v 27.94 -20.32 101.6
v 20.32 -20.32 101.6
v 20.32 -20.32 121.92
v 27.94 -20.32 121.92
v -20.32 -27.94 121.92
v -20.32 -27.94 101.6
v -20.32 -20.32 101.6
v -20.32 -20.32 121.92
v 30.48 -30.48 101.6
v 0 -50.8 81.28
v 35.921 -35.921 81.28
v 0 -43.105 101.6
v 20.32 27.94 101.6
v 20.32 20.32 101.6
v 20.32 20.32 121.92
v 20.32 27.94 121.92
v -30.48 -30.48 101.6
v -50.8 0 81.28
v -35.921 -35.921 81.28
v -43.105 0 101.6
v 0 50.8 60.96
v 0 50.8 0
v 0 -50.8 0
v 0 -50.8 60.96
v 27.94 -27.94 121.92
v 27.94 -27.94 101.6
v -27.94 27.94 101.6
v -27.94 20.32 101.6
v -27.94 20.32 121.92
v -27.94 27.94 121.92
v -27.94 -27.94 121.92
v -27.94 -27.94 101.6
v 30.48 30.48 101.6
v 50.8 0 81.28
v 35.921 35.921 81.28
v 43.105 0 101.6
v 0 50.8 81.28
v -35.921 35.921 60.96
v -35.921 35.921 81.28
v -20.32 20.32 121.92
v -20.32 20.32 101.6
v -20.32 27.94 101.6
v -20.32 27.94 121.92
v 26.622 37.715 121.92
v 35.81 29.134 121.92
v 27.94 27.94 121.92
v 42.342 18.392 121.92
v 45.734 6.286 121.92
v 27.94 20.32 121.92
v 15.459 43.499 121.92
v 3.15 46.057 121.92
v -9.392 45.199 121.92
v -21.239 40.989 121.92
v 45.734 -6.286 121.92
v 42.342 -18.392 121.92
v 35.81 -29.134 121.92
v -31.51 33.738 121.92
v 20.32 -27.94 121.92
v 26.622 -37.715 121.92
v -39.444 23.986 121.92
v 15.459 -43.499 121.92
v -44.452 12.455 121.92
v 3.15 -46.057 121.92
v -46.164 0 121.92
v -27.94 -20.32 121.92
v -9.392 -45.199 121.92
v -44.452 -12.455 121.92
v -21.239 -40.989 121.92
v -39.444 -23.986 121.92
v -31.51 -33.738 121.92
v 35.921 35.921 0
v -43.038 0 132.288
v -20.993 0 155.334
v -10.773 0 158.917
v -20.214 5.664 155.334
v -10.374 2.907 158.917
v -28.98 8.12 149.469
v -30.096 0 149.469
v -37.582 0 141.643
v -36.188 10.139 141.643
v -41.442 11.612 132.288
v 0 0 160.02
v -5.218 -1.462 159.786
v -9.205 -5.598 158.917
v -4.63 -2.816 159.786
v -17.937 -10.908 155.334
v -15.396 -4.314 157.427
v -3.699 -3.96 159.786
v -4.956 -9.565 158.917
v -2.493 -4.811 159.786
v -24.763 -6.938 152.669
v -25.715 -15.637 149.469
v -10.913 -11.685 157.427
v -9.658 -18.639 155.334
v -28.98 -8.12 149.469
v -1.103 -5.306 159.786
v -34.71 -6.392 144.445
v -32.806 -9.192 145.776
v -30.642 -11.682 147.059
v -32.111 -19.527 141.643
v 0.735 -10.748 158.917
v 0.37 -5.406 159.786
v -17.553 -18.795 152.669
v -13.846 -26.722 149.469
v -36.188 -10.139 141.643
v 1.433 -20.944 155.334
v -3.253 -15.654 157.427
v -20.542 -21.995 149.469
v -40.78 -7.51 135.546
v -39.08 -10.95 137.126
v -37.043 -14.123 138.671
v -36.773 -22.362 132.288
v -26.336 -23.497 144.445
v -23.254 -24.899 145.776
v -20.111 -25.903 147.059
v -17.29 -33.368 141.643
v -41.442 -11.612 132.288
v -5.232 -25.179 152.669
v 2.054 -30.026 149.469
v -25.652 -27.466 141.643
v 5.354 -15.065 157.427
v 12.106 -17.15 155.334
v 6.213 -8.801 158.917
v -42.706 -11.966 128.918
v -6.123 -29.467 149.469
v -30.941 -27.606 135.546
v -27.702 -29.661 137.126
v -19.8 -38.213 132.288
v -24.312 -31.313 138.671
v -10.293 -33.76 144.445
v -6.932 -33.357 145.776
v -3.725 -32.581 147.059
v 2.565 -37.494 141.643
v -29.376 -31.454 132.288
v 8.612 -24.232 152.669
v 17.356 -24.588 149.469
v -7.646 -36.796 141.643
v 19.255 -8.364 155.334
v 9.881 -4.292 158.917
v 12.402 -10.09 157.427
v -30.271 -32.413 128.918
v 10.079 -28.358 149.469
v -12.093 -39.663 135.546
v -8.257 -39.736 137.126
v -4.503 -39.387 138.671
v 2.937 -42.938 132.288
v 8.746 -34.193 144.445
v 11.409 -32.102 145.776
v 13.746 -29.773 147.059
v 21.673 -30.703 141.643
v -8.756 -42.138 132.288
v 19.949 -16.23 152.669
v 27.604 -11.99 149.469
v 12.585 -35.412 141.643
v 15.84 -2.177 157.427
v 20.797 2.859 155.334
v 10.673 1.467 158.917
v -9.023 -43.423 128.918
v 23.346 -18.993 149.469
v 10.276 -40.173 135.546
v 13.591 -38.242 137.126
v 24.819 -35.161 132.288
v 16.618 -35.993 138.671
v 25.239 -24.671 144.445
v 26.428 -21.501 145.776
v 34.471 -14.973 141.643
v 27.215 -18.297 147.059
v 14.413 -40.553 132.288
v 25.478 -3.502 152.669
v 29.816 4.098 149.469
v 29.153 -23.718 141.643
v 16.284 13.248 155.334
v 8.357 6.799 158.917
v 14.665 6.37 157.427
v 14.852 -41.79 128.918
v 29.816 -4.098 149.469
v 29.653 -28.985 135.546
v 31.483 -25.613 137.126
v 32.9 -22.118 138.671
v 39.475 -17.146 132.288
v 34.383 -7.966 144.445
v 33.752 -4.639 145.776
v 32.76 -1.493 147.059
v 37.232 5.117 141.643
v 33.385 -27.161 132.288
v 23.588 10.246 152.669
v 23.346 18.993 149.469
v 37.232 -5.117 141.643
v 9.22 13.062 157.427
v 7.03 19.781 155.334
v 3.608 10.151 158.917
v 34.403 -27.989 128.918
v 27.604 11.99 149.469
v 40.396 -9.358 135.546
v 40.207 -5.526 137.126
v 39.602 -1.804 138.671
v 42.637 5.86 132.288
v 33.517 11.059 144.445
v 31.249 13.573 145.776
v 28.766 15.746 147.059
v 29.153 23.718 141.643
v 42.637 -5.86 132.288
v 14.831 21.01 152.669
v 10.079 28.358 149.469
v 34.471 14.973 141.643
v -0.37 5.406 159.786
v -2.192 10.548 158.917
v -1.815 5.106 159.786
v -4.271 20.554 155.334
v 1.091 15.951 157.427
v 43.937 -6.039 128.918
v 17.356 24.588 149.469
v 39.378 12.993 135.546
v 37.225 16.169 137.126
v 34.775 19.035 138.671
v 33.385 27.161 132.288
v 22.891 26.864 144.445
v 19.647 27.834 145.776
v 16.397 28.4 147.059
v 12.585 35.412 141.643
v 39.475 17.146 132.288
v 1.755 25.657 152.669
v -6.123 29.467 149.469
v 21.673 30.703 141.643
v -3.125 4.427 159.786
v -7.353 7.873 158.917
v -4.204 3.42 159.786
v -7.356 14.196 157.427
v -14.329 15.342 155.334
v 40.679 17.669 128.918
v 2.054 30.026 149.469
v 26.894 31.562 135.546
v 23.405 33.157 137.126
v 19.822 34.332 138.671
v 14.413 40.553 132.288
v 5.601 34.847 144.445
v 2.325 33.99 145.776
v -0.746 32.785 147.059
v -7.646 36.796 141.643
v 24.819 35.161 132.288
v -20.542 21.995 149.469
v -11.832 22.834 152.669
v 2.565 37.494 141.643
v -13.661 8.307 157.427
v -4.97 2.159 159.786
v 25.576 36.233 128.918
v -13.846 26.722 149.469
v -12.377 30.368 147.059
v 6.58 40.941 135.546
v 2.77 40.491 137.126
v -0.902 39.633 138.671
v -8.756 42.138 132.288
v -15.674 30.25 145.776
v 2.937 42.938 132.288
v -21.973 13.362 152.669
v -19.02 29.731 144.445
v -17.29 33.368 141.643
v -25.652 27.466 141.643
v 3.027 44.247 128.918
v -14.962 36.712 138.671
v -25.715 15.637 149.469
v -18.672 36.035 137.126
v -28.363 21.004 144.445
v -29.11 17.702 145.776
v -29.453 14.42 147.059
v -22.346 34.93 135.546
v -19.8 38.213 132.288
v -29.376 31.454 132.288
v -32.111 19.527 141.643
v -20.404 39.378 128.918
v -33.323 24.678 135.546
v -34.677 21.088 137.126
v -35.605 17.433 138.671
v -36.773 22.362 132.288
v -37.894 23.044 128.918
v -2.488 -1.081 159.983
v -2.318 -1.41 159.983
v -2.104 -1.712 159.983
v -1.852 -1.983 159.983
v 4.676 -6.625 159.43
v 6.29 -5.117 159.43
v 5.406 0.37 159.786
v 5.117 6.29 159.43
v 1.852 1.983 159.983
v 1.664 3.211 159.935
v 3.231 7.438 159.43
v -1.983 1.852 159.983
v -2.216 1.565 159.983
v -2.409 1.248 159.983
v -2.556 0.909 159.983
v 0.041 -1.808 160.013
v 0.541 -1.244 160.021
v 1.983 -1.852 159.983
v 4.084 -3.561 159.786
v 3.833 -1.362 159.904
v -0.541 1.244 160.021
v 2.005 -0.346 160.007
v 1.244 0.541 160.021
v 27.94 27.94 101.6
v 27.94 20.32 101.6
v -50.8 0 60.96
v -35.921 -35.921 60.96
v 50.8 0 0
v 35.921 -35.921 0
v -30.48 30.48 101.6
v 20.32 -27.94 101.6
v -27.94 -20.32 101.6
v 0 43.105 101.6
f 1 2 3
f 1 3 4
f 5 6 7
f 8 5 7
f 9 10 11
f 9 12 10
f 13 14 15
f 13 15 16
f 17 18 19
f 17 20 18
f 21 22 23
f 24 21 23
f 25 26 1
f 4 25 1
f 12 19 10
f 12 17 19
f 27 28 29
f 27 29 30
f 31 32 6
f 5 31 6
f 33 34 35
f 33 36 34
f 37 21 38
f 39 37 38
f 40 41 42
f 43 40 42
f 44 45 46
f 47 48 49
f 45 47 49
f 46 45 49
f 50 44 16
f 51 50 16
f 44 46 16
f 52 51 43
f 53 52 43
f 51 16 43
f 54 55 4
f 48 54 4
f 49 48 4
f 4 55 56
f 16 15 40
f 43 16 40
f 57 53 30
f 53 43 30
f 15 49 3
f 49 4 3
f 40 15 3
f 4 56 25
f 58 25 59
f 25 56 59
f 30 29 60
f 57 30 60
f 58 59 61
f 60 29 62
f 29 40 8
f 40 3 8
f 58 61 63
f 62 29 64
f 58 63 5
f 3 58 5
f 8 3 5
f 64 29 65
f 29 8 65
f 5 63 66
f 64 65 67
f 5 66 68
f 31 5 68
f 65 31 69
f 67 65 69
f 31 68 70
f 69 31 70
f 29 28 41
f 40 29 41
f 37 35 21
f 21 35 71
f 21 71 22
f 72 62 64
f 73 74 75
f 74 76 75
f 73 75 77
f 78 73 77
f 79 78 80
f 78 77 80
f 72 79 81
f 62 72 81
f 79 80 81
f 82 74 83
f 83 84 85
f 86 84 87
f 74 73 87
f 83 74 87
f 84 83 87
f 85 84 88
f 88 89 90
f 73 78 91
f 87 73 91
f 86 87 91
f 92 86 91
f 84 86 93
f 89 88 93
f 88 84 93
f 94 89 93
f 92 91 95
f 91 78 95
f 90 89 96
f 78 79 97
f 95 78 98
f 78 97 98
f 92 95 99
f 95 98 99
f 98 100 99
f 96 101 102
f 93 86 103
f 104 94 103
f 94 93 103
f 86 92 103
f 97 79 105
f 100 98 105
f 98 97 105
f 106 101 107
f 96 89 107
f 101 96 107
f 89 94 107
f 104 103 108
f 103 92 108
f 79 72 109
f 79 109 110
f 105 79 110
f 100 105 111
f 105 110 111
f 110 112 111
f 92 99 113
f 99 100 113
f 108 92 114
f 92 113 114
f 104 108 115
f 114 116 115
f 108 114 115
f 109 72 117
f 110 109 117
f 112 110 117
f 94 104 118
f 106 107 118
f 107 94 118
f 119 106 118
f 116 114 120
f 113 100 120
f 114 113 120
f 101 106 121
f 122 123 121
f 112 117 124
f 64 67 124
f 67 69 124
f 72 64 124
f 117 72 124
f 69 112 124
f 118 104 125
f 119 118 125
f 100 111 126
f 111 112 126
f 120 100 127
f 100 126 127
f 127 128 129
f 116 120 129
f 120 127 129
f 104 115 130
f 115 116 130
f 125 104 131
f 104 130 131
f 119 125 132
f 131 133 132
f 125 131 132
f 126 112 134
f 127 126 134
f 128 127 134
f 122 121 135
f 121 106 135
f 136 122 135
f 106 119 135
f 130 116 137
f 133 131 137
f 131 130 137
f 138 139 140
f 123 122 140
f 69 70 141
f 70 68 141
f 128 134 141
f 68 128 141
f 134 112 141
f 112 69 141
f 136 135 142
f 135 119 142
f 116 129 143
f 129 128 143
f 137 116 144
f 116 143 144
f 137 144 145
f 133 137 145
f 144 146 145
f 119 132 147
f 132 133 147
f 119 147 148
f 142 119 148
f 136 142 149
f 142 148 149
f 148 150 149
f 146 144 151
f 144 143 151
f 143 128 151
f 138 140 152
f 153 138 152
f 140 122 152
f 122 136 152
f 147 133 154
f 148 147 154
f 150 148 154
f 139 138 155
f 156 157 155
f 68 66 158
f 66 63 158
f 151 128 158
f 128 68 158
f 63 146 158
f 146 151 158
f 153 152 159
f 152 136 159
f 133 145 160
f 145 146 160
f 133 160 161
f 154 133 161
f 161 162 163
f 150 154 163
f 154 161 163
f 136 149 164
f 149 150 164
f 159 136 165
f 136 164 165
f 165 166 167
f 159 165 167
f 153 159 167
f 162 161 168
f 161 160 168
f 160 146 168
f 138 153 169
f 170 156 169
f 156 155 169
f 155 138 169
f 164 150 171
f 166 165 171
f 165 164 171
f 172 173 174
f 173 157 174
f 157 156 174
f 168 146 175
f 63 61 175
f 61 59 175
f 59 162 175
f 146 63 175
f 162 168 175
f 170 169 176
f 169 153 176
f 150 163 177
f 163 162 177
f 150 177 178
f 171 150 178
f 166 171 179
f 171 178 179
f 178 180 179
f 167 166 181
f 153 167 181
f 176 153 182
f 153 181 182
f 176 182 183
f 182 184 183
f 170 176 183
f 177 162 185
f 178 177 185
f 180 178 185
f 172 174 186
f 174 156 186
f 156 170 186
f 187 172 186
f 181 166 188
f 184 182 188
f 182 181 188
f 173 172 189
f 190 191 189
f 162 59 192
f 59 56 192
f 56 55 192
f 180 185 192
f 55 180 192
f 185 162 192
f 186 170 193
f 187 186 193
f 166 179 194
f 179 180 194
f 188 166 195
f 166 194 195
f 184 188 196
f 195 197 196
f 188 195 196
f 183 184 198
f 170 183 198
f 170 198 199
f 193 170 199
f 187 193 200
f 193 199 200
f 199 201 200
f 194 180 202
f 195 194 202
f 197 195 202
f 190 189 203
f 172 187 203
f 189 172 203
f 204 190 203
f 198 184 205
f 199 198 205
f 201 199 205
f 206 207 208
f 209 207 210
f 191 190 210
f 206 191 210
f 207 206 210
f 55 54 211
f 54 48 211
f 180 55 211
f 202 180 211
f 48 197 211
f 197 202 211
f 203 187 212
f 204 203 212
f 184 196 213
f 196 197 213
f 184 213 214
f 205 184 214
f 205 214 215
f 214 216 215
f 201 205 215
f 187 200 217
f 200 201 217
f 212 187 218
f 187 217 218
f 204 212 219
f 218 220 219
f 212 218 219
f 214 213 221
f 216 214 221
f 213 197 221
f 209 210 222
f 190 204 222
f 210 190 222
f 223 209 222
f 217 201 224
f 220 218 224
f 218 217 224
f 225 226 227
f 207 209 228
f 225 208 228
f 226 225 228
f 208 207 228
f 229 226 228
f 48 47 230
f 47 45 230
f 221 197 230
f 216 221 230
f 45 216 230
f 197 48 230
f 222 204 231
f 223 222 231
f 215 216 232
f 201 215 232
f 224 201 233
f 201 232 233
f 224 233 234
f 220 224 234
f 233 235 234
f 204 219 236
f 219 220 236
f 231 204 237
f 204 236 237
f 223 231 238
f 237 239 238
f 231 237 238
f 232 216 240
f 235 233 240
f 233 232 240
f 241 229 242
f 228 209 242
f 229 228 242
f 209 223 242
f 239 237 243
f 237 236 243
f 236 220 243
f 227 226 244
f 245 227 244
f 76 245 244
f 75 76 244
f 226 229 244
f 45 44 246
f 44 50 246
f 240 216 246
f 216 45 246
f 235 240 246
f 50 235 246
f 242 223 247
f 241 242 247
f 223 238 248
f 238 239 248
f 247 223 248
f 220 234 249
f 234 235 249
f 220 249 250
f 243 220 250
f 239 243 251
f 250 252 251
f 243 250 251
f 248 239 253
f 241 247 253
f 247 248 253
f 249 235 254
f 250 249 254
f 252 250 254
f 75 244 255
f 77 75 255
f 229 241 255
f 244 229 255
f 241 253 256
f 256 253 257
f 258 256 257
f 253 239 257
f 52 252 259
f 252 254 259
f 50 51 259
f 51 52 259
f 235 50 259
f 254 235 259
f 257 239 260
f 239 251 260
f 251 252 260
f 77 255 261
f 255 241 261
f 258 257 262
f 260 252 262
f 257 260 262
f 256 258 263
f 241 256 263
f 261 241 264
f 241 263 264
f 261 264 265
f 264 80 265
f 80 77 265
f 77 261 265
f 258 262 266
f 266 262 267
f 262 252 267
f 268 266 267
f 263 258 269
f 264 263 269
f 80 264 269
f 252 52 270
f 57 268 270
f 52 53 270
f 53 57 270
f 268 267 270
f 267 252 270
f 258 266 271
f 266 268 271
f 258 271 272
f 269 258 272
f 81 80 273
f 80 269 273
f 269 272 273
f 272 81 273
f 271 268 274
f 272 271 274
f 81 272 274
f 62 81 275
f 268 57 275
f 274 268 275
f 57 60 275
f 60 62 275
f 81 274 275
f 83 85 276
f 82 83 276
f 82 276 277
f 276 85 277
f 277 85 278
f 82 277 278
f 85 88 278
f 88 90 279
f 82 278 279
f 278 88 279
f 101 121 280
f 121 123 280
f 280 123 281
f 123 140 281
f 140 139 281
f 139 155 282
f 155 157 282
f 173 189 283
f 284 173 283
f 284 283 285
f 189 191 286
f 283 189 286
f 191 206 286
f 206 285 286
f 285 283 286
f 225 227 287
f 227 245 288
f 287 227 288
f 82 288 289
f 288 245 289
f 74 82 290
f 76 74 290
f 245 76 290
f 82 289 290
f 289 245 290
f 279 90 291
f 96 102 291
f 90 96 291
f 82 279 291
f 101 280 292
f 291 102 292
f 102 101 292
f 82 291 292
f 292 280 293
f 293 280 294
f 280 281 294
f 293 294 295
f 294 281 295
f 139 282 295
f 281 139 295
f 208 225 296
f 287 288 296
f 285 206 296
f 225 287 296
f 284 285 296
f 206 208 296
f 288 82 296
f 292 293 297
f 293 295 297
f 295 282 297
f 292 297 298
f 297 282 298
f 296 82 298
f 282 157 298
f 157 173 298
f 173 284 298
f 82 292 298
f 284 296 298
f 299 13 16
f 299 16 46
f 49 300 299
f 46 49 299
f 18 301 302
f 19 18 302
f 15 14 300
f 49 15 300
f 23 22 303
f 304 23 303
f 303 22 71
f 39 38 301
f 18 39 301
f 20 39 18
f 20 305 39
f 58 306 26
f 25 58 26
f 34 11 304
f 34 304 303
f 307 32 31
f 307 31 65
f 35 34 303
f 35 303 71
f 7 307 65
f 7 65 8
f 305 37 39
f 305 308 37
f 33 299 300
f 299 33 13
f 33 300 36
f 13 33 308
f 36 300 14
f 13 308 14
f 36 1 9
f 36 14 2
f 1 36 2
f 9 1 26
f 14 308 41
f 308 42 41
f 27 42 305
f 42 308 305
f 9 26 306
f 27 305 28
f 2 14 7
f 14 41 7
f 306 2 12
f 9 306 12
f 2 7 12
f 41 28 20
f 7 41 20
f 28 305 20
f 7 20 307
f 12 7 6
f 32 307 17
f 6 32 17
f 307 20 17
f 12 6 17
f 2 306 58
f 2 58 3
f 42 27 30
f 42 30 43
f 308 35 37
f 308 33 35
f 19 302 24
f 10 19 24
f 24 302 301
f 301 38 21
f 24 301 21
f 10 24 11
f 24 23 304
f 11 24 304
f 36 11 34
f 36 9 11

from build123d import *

# Parameters (mm, degrees)
F2_DEPTH  = 60.96
F4_DEPTH  = 20.32
F9_W      = 7.62
F9_H      = 7.62
F14_DEPTH = 20.32


with BuildPart() as f2:
    # F0 (on Top) → F2 (new body)
    with BuildSketch(Plane.XY):
        Polygon((35.9210244843, 35.9210244843), (0, 50.8), (0, -50.8), (35.9210244843, -35.9210244843), (50.8, 0), align=None)
    extrude(amount=F2_DEPTH)

    # F3 (on offset) → F4 (join)
    with BuildSketch(Plane.XY.offset(60.96)):
        Polygon((35.9210244843, 35.9210244843), (0, 50.8), (-35.9210244843, 35.9210244843), (-50.8, 0), (-35.9210244843, -35.9210244843), (0, -50.8), (35.9210244843, -35.9210244843), (50.8, 0), align=None)
    extrude(amount=F4_DEPTH)

    # F7 (on offset) → F13 section 0
    with BuildSketch(Plane.XY.offset(81.28)):
        Polygon((0, 50.8), (-35.9210244843, 35.9210244843), (-50.8, 0), (-35.9210244843, -35.9210244843), (0, -50.8), (35.9210244843, -35.9210244843), (50.8, 0), (35.9210244843, 35.9210244843), align=None)
    # F8 (on offset) → F13 section 1
    with BuildSketch(Plane.XY.offset(101.6)):
        Polygon((43.1052293811, 0), (30.48, 30.48), (0, 43.1052293811), (-30.48, 30.48), (-43.1052293811, 0), (-30.48, -30.48), (0, -43.1052293811), (30.48, -30.48), align=None)
    loft()

    # F9 (on offset) → F14 (join)
    with BuildSketch(Plane.XY.offset(101.6)):
        with Locations((-24.13, 24.13)):
            Rectangle(F9_W, F9_H)
        with Locations((24.13, 24.13)):
            Rectangle(F9_W, F9_H)
        with Locations((-24.13, -24.13)):
            Rectangle(F9_W, F9_H)
        with Locations((24.13, -24.13)):
            Rectangle(F9_W, F9_H)
    extrude(amount=F14_DEPTH)

    # F15 (on Front) → F16 (revolve)
    with BuildSketch(Plane.XZ):
        with BuildLine():
            ThreePointArc((0, 160.02), (-30.0961069105, 149.4685742909), (-46.1642209939, 121.92))
            Line((-46.1642209939, 121.92), (0, 121.92))
            Line((0, 121.92), (0, 160.02))
        make_face()
    revolve(axis=Axis((0, 0, 140.97), (0, 0, 1)))


solid = f2.part
